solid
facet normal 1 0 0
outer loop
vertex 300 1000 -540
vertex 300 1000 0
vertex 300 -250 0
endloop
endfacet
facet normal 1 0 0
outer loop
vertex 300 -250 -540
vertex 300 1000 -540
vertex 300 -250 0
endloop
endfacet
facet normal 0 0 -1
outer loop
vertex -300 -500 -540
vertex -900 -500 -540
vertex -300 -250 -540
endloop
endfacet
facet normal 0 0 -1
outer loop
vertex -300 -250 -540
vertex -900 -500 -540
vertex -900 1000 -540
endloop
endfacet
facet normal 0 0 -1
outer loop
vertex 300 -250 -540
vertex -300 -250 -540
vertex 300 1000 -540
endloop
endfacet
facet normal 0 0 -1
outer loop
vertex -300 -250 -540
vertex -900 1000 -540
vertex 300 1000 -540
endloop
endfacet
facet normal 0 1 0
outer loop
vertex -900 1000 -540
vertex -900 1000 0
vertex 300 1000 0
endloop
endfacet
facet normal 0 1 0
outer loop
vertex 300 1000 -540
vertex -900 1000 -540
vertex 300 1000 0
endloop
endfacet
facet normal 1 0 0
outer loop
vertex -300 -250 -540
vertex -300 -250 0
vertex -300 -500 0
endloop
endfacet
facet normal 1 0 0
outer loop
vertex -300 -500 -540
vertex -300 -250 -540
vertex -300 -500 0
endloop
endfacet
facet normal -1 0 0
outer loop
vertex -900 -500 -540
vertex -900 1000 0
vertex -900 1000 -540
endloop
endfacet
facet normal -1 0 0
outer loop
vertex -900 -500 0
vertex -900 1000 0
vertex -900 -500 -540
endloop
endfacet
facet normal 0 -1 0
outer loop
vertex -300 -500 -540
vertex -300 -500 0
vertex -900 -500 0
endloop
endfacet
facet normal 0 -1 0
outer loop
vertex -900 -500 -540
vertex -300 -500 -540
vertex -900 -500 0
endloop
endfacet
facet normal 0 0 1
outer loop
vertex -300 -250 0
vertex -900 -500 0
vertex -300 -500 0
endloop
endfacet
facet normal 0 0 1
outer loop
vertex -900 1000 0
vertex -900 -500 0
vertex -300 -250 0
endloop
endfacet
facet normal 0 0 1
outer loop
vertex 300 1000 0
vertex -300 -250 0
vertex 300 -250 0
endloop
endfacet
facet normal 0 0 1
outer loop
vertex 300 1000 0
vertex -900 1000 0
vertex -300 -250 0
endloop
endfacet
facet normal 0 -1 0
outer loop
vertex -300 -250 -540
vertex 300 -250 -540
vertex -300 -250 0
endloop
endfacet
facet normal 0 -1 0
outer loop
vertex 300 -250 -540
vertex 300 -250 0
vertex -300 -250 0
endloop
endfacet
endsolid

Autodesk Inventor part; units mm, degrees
ref_plane "YZ Plane" through (0, 0, 0) normal (1, 0, 0) x (0, 1, 0)
ref_plane "XZ Plane" through (0, 0, 0) normal (0, 1, 0) x (-1, 0, 0)
ref_plane "XY Plane" through (0, 0, 0) normal (0, 0, 1) x (1, 0, 0)
ref_plane "Work Plane1" through (0, 0, 0) normal (0, 0, 1) x (1, 0, 0)
sketch "Sketch2" plane through (0, 0, 0) normal (0, 0, 1) x (1, 0, 0)
  line L0 (-900, -1000) -> (900, -1000) projected
  line L1 (900, -1000) -> (900, 1000) projected
  line L2 (900, 1000) -> (-900, 1000) projected
  line L3 (-900, 1000) -> (-900, -1000) projected
  line L4 (900, -1000) -> (-900, -1000) projected
  line L5 (-900, -1000) -> (-900, -500)
  line L6 (-900, -1000) -> (-900, 1000) projected
  line L7 (-300, -500) -> (-300, -250)
  line L8 (-300, -250) -> (300, -250)
  line L9 (300, -250) -> (300, 1000)
  line L10 (-900, 1000) -> (-900, -500)
  line L11 (-300, -500) -> (-900, -500)
  point P0 (0, 0)
  point P1 (-300, -1000)
  point P2 (300, -1000)
  dimension "d4" = 600
  dimension "d5" = 600
  dimension "d6" = 600
  dimension "d7" = 500
  dimension "d8" = 1200
  dimension "d9" = 750
  dimension "d10" = 1500
extrude "Extrusion2" [suppressed]
ref_plane "Work Plane2" through (0, 0, 0) normal (0, 0, 1) x (1, 0, 0)
sketch "Sketch4" plane through (0, 0, 0) normal (0, 0, 1) x (1, 0, 0)
  line L0 (-300, -500) -> (-900, -500) projected
  line L1 (-900, -500) -> (-900, -1000) projected
  line L2 (-900, -1000) -> (900, -1000) projected
  line L3 (900, -1000) -> (900, 1000) projected
  line L4 (900, 1000) -> (300, 1000) projected
  line L5 (300, 1000) -> (300, -250) projected
  line L6 (300, -250) -> (-300, -250) projected
  line L7 (-300, -250) -> (-300, -500) projected
  line L8 (300, 1000) -> (300, -250)
  line L9 (300, -250) -> (-300, -250)
  line L10 (-300, -500) -> (-900, -500)
  line L11 (-300, -500) -> (-300, -250) projected
  line L12 (-900, 1000) -> (300, 1000)
  line L13 (-900, 1000) -> (-900, -500)
  point P0 (0, 0)
extrude "Extrusion4" add sketch "Sketch4" against normal blind 540 contours L0 L13 L12 L5 L6 L7
properties part number "data" material "ABS Plastic"
